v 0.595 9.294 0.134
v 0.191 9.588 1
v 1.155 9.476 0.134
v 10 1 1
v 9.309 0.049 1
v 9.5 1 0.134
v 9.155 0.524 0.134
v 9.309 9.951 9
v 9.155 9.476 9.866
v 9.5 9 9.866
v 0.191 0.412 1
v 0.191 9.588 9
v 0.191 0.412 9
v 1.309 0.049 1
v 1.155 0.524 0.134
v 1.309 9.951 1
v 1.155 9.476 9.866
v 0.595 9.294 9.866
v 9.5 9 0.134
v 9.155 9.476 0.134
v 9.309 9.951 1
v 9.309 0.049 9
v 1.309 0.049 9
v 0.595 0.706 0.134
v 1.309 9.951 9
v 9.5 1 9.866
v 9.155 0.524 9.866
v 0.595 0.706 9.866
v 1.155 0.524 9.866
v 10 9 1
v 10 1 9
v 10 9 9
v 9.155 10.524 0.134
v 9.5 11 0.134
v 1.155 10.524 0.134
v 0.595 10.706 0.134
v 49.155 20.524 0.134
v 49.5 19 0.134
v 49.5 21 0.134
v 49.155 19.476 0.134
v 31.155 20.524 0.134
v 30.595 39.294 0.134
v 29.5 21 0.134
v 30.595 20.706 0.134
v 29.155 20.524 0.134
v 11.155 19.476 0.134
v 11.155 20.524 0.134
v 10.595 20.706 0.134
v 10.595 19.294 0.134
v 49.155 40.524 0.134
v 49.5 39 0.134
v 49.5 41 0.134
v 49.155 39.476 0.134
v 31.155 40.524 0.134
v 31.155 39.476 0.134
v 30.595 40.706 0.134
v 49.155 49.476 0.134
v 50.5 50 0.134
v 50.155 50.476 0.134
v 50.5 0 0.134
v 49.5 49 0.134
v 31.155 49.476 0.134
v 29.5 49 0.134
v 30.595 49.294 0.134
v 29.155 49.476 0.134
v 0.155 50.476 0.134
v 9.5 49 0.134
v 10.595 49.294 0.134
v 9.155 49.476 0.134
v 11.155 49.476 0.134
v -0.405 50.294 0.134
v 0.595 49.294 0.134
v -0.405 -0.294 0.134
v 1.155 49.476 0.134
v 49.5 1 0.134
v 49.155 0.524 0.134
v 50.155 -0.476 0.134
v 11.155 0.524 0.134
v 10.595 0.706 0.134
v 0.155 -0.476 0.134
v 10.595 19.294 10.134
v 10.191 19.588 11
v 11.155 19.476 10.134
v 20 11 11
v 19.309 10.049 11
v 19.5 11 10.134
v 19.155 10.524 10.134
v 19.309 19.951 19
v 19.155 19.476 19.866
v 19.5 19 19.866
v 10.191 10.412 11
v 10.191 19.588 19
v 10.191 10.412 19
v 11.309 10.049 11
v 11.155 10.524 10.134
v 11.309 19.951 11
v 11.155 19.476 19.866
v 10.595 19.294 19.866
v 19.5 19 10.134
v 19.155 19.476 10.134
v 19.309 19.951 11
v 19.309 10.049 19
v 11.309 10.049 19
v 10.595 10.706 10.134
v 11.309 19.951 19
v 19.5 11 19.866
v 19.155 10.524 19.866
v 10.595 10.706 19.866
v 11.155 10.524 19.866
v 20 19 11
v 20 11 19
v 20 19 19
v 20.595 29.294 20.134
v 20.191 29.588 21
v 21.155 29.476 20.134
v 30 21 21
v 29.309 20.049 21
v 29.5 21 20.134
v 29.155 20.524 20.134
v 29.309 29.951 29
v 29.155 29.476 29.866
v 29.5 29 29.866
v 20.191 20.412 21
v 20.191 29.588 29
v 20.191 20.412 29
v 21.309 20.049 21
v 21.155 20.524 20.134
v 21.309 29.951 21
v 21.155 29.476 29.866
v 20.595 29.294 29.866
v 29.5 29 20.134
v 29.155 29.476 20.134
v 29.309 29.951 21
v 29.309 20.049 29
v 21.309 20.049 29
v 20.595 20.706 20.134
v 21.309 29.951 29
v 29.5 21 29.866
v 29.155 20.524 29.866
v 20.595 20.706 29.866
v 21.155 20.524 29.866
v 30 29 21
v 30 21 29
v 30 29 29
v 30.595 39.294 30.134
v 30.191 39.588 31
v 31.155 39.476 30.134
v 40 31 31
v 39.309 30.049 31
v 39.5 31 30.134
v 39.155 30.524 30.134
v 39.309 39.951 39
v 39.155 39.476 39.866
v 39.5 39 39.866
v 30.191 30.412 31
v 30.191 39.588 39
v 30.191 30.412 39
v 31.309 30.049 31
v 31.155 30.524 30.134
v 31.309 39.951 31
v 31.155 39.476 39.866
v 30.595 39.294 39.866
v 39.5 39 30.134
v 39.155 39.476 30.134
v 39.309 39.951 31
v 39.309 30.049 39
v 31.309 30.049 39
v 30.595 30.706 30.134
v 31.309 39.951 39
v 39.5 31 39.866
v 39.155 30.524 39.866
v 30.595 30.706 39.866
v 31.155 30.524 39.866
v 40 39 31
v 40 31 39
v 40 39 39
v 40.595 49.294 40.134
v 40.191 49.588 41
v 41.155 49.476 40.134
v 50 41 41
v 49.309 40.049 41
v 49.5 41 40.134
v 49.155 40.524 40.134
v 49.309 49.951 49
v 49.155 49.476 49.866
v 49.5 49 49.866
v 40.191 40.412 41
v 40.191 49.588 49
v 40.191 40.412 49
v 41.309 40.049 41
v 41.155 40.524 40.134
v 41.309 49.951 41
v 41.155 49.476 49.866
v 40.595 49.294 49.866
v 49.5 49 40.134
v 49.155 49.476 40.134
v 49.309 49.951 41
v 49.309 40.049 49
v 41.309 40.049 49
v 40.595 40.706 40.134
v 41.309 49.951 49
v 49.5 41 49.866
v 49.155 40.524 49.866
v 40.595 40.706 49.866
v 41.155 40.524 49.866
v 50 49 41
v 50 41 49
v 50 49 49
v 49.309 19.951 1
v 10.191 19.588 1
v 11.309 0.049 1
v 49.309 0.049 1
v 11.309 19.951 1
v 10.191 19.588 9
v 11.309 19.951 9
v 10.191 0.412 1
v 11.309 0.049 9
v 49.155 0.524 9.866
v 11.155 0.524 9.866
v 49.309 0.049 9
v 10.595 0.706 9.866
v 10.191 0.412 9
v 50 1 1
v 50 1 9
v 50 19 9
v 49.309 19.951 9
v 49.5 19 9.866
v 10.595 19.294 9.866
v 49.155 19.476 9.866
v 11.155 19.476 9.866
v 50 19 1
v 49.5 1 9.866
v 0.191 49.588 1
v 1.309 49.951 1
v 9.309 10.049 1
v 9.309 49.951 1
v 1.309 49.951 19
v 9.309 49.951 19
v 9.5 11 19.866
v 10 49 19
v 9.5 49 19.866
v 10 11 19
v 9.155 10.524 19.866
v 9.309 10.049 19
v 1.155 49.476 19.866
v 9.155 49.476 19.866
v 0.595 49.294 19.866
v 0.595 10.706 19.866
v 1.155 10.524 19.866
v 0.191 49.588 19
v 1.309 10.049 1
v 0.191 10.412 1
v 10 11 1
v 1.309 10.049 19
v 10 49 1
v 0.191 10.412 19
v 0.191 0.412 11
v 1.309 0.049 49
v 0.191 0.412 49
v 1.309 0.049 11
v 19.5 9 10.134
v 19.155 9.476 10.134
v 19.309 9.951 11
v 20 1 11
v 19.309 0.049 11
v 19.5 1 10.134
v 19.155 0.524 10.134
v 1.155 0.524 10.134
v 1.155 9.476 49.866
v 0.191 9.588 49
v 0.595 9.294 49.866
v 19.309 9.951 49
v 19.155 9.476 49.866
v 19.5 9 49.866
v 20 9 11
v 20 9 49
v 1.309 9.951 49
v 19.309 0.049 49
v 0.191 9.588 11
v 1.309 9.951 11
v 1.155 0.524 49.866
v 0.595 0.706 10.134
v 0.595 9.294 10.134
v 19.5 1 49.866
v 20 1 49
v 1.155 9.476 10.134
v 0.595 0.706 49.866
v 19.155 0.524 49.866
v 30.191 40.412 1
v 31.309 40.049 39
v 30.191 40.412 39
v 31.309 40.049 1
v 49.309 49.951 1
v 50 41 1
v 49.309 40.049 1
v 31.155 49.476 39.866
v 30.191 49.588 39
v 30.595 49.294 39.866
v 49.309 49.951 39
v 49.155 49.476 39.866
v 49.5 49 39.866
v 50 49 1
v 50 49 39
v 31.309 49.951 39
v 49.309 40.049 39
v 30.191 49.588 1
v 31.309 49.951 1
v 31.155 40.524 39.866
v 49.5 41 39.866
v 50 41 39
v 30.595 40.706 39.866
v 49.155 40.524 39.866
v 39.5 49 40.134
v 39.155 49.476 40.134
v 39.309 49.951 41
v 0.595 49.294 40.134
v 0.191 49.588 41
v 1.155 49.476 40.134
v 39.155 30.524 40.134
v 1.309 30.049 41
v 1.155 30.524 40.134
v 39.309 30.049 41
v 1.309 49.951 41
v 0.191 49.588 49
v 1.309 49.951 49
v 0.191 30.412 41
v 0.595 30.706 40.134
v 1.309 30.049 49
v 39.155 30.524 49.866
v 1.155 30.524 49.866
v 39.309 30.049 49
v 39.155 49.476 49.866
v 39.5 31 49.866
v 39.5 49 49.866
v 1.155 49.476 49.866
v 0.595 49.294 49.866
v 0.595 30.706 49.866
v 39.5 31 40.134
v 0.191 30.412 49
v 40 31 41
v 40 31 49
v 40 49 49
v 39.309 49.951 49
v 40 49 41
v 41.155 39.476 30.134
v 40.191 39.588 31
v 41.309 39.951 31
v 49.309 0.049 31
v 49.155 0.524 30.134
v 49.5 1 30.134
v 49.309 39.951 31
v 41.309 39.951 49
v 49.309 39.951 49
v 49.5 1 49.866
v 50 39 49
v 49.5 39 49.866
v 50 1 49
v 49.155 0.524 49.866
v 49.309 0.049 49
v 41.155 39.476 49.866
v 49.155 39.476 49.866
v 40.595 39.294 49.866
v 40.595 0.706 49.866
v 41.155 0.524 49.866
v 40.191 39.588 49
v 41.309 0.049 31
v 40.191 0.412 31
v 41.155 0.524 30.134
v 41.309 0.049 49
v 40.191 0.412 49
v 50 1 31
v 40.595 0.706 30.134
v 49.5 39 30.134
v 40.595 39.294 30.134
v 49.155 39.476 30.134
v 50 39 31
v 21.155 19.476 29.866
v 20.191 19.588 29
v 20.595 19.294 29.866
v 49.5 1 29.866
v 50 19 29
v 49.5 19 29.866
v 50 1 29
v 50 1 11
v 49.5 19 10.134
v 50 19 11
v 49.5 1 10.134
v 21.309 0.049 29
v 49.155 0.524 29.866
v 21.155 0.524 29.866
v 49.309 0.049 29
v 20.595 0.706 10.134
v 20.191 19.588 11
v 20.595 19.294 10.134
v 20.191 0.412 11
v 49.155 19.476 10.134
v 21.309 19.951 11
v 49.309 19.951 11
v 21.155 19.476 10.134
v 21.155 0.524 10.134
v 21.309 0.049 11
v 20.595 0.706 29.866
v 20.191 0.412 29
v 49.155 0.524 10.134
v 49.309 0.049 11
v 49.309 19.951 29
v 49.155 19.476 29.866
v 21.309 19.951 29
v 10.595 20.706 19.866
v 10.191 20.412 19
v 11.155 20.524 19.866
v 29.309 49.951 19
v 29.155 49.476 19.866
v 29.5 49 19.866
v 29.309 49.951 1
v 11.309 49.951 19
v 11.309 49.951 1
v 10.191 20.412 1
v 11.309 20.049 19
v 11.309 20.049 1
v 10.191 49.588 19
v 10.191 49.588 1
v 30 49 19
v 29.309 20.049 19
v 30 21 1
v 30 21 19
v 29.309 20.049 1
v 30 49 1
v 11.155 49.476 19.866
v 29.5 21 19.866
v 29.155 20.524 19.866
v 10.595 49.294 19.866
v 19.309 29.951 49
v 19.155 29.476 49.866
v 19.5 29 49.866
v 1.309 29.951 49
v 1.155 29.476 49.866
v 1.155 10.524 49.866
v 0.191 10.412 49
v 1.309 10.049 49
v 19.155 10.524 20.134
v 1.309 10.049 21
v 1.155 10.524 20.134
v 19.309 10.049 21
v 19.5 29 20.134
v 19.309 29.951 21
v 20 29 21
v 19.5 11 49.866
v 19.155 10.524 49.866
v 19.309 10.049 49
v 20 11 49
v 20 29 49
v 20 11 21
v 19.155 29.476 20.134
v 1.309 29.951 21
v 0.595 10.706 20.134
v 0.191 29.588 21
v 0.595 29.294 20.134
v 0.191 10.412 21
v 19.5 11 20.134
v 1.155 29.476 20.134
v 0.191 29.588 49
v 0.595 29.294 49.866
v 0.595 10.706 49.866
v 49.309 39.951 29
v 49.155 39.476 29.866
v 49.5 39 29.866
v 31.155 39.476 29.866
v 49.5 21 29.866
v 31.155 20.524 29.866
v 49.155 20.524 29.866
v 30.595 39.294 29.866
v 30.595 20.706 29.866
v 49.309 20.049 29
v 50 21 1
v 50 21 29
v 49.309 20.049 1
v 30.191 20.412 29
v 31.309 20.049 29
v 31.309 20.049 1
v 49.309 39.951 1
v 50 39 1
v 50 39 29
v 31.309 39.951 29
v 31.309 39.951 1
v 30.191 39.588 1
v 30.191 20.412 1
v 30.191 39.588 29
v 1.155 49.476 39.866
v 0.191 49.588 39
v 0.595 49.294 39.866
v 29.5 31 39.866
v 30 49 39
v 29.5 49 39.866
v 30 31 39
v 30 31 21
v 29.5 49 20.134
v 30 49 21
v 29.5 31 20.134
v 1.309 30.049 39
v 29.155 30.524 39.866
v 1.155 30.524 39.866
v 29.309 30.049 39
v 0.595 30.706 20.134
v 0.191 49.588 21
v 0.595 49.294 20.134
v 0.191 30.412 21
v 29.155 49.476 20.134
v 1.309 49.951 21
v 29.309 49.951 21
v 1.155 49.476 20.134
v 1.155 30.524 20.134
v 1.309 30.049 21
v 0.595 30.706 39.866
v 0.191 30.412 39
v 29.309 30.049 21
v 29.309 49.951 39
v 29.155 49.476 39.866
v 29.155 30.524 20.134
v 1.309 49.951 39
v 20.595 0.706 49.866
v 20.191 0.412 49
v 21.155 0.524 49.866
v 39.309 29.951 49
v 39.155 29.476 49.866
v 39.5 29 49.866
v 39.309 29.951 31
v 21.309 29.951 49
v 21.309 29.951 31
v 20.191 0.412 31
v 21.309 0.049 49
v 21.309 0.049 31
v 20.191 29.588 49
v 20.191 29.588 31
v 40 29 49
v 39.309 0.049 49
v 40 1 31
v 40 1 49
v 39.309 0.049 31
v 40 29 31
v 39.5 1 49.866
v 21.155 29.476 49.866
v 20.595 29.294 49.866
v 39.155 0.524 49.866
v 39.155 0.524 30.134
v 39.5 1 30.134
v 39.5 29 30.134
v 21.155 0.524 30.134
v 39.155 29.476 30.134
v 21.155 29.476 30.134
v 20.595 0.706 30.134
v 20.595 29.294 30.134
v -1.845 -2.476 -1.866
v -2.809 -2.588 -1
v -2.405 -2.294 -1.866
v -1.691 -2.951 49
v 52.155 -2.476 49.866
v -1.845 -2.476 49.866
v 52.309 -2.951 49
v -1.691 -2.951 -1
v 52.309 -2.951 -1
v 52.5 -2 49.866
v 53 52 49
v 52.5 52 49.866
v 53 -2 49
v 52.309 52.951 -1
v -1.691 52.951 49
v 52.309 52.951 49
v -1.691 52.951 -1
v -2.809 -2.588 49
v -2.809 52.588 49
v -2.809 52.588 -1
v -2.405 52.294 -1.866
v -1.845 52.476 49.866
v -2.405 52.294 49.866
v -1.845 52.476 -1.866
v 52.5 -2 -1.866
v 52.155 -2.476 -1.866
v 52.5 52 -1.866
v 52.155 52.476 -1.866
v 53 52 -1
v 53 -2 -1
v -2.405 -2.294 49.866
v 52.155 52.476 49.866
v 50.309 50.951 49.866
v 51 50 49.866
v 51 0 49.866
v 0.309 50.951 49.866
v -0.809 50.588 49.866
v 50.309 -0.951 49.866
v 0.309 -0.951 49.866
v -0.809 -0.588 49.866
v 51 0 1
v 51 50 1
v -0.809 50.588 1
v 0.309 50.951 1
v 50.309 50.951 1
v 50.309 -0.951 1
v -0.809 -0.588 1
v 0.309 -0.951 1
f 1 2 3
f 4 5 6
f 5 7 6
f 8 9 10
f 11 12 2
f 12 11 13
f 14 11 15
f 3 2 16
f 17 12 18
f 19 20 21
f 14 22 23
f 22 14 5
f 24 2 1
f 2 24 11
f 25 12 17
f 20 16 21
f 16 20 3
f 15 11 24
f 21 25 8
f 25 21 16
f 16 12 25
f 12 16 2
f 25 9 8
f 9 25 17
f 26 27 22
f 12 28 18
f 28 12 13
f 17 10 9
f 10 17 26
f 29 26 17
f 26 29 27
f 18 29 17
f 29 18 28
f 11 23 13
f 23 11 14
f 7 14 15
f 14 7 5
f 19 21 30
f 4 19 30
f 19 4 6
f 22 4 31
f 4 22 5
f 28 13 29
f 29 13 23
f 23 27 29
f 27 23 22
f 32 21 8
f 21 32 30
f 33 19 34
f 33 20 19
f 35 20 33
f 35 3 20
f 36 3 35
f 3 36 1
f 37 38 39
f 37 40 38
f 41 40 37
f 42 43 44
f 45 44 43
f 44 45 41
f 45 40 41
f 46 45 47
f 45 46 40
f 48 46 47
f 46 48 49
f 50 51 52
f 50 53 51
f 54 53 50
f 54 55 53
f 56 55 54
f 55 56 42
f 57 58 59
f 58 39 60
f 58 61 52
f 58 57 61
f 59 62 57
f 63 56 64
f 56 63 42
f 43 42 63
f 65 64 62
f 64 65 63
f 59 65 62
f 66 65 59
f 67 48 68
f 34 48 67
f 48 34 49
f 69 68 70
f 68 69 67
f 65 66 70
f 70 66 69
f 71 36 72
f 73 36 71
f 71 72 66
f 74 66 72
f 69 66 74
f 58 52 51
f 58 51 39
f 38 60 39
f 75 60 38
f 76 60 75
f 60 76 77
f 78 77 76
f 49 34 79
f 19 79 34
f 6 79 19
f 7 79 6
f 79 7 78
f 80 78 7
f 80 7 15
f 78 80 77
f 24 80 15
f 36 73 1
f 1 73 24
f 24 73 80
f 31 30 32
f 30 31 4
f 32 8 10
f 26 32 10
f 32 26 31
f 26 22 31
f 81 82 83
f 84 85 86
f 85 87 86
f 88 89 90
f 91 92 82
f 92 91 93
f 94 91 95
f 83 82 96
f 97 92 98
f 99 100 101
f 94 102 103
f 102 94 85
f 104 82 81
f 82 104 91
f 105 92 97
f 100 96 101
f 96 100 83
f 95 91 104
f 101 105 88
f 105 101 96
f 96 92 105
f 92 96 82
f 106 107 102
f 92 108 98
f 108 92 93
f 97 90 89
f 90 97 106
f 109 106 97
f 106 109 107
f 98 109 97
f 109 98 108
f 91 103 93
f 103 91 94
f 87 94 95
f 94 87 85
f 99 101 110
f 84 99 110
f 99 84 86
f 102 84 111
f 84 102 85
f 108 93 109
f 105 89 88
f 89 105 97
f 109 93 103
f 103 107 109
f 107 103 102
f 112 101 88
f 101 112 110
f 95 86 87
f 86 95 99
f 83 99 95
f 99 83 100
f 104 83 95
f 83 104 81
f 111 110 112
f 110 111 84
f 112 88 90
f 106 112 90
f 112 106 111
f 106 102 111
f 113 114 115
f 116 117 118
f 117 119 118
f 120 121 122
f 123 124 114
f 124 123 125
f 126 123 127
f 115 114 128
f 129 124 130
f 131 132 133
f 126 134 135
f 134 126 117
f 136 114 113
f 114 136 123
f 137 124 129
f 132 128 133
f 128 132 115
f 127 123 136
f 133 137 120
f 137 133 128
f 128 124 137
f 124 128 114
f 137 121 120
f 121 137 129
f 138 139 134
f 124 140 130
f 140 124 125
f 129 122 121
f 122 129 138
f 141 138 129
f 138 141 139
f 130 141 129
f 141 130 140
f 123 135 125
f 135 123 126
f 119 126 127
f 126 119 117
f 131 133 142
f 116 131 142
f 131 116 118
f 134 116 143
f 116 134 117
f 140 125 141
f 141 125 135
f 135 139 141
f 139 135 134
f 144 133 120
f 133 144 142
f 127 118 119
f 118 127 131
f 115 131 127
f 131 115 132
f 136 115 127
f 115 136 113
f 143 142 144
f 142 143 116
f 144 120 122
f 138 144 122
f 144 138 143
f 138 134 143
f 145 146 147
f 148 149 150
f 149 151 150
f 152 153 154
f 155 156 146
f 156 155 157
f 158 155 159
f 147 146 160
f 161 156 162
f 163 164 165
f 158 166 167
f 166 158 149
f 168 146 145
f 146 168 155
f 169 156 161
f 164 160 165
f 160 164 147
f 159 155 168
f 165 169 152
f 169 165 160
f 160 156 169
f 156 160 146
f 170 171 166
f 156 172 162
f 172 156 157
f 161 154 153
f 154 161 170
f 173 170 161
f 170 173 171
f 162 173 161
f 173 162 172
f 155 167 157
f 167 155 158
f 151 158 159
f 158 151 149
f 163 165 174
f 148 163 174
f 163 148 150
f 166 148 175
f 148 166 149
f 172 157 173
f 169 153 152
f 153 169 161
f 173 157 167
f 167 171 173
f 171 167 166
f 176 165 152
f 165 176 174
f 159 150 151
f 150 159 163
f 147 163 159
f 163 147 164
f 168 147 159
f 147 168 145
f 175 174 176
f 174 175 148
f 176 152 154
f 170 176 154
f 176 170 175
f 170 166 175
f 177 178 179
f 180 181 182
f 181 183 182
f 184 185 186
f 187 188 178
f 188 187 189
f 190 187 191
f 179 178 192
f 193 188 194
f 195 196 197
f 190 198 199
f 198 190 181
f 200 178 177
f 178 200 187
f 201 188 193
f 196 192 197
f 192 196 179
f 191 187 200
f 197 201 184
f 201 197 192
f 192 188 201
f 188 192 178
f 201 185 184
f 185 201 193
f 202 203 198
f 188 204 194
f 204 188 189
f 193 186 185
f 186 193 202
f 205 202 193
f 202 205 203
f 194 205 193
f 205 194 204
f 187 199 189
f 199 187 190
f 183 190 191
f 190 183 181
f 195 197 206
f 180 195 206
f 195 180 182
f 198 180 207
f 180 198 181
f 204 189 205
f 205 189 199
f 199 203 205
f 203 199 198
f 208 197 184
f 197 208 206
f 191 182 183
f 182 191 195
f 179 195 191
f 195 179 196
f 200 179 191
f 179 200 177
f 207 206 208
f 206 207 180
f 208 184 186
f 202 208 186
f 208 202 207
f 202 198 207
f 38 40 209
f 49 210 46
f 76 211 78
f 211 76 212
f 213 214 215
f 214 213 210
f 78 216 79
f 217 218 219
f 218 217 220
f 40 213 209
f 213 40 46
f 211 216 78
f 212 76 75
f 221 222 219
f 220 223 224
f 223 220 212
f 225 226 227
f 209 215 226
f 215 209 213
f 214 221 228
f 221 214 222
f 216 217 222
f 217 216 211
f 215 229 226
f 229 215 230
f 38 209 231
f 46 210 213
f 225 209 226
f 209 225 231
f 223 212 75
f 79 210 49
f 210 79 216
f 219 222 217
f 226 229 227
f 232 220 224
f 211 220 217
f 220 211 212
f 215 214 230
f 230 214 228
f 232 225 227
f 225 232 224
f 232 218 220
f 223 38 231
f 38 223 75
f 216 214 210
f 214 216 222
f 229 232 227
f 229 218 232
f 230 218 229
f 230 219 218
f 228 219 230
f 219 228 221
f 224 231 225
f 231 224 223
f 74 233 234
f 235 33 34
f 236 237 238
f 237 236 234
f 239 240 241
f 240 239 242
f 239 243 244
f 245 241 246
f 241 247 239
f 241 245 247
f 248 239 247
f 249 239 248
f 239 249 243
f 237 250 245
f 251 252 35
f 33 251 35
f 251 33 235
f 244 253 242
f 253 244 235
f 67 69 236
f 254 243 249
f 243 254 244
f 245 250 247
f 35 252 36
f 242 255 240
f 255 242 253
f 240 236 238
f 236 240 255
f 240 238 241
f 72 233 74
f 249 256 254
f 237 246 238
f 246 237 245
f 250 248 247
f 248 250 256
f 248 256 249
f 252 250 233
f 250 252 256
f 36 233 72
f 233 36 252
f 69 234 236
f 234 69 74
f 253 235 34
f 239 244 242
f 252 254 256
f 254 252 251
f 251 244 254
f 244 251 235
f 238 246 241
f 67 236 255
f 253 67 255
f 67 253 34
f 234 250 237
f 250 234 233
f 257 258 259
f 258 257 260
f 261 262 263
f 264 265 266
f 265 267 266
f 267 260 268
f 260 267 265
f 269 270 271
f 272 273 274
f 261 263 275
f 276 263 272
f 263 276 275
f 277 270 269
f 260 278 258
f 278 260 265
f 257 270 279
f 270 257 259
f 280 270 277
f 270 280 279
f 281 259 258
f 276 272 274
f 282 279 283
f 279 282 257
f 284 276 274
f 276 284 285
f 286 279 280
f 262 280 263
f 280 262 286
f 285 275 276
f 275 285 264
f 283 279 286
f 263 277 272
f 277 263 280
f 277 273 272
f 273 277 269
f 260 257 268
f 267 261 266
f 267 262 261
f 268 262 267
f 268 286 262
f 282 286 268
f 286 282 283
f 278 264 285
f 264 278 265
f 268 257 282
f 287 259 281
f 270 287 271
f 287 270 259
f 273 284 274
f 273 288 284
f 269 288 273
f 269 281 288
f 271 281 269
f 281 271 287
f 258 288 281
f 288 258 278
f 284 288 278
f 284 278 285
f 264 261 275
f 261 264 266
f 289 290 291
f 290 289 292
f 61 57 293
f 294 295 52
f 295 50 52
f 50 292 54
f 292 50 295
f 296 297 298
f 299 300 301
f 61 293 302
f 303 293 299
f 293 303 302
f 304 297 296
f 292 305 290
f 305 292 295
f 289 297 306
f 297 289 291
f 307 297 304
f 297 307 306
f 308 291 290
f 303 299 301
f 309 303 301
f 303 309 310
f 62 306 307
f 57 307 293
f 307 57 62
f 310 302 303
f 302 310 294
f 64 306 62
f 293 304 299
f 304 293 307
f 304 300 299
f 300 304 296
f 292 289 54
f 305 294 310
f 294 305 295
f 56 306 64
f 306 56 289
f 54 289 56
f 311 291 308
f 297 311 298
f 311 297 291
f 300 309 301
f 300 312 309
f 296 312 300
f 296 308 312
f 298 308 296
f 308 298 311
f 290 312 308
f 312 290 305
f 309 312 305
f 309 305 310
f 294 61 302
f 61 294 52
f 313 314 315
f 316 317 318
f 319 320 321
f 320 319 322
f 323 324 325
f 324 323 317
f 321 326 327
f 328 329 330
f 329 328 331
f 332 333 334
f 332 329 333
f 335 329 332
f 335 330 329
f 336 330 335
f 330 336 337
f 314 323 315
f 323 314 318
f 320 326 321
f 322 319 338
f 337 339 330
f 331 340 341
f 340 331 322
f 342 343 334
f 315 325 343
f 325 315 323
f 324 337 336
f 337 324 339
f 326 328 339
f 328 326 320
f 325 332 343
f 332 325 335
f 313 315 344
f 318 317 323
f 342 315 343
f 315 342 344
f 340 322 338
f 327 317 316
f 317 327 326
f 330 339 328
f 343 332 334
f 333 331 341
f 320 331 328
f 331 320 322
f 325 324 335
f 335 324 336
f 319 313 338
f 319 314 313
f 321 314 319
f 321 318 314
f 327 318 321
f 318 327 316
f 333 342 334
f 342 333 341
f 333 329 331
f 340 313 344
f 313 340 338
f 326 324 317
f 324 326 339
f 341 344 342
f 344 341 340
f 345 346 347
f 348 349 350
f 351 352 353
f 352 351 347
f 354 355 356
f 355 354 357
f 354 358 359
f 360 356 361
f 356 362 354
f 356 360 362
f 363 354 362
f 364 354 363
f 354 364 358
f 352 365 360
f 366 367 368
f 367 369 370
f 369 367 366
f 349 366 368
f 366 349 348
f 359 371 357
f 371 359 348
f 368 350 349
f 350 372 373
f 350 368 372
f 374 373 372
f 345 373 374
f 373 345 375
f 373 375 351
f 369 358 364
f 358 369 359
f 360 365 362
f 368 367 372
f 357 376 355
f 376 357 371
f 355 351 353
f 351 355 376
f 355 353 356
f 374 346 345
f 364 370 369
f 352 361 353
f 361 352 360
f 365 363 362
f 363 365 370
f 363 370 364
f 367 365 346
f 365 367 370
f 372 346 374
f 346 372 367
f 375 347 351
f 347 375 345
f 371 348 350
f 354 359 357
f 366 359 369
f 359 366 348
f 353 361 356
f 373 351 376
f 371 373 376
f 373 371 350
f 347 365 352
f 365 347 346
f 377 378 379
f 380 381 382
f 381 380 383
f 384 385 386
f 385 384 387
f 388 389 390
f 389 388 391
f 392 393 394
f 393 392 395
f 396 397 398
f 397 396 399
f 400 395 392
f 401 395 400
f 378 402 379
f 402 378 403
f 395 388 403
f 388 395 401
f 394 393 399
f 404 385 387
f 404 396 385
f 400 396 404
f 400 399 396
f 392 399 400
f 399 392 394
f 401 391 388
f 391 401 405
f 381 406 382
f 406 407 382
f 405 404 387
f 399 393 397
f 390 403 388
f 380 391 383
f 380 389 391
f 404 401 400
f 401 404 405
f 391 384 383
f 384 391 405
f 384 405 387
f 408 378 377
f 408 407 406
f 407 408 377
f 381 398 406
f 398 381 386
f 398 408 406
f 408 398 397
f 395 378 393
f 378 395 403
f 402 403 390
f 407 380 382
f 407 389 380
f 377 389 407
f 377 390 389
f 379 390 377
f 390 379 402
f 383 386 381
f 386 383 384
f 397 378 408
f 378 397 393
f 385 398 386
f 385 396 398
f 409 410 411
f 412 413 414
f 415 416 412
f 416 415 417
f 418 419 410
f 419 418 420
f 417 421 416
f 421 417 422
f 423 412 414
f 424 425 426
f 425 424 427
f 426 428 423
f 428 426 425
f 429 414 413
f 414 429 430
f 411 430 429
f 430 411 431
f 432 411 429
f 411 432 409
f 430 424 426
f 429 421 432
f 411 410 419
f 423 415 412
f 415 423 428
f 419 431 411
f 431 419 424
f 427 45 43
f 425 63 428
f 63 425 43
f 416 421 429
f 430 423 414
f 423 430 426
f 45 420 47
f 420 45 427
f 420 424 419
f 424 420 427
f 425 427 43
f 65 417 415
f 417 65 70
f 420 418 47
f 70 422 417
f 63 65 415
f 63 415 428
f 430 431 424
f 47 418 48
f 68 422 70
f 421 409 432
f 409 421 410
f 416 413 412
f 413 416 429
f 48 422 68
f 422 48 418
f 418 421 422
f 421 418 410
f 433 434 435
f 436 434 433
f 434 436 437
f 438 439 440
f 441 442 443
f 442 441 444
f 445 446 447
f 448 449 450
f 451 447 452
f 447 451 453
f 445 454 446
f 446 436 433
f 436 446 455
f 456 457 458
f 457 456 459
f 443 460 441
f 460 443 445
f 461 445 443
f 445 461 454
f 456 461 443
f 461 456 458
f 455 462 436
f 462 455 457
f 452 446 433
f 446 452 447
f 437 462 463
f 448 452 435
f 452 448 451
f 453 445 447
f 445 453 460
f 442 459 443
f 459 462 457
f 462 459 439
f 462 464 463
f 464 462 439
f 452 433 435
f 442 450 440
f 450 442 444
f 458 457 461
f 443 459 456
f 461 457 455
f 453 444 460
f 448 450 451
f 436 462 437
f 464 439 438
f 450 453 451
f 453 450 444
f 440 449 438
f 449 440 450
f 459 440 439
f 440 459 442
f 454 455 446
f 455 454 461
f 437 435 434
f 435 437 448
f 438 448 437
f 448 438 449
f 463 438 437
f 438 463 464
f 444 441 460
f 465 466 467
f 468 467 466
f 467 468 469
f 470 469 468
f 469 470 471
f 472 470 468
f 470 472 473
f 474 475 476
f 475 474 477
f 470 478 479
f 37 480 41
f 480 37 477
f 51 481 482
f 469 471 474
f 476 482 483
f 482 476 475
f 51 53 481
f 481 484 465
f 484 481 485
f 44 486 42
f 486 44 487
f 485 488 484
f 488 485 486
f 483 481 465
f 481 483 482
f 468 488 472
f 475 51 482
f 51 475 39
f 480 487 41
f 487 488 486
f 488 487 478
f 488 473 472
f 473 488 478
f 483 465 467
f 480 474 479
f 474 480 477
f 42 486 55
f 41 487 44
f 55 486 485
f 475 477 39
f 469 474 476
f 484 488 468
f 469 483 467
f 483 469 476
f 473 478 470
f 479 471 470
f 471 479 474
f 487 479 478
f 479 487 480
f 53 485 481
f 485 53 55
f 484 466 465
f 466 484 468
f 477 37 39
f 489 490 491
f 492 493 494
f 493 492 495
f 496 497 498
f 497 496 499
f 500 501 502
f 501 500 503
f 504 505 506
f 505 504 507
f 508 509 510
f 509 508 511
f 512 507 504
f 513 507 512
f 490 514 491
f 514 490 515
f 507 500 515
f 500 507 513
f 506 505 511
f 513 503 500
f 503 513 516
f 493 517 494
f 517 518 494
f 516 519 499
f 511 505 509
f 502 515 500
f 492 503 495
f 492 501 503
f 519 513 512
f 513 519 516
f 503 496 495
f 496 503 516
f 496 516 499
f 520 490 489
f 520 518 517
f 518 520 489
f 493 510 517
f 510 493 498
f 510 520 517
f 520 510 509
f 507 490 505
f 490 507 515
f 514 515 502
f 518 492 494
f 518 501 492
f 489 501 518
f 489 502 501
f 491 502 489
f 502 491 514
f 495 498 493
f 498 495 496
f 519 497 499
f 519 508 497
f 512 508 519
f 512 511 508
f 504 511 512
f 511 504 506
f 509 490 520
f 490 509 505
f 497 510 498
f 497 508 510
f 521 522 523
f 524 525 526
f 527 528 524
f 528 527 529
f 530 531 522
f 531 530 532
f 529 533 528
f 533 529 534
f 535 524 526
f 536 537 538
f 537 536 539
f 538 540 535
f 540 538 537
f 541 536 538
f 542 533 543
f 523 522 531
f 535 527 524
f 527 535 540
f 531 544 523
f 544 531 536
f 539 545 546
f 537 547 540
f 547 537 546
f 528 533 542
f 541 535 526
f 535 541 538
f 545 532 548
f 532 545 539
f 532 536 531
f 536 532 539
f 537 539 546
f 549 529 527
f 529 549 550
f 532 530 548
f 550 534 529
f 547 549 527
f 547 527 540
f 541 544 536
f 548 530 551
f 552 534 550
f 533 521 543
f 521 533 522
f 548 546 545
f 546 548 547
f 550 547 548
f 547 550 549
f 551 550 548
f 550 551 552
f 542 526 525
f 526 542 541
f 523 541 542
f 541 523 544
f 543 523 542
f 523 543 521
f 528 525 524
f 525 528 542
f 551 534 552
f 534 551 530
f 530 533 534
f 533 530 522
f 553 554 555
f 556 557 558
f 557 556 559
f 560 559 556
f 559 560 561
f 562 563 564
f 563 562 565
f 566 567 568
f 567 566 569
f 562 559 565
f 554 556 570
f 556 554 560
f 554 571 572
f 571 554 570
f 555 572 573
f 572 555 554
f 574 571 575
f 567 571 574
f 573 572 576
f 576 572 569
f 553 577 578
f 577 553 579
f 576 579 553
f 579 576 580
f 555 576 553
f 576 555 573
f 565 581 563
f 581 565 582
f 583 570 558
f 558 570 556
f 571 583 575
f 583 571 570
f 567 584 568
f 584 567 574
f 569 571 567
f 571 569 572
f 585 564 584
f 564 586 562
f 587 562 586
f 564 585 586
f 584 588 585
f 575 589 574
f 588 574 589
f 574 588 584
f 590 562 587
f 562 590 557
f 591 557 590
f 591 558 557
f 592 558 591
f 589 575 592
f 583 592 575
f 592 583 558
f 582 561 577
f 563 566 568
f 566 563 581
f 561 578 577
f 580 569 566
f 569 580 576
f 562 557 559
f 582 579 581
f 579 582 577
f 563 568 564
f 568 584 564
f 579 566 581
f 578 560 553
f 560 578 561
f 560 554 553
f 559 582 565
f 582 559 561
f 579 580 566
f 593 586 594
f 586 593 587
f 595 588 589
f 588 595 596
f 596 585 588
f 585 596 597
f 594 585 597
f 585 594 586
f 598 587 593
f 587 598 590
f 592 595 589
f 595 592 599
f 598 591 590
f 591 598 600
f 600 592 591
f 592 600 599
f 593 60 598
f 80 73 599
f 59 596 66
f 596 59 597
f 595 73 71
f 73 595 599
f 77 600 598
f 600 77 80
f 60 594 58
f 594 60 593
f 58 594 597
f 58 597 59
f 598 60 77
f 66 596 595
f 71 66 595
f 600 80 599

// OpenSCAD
// file: modules.scad
unit = 10;

module roundCube(dimensions, margin=1) {
  cubeDimensions = [for(d = dimensions) d - 2*margin];
  translate([margin, margin, margin])
  minkowski() {
    cube(cubeDimensions);
    sphere(r=margin, center=true);
  }
}

module puzzleBox(unit, margin=1) {
  u = 5 * unit + margin;
  2m = 2 * margin;
  hm = -margin / 2;

  translate([hm, hm, 0]) {
    color([0, 1, 0]) {
      difference() {
        translate([-margin, -margin, -margin])
        roundCube([u+2m, u+2m, u]);

        translate([0, 0, 2m])
        roundCube([u, u, u]);
        translate([0, 0, 0])
        roundCube([u, u, u]);
      }
    }
  }
}
// main file
include <modules.scad>

module thrice(translations, dimensions, unit) {
  ts = [for(t=translations) t * unit];
  ds = [for(d=dimensions) d * unit];

  translate(ts)
  roundCube(ds);

  translate([ts[2], ts[0], ts[1]])
  roundCube([ds[2], ds[0], ds[1]]);

  translate([ts[1], ts[2], ts[0]])
  roundCube([ds[1], ds[2], ds[0]]);
}

module puzzle(unit) {
  for(i=[0:4]) {
    translate([i*unit, i*unit, i*unit])
    roundCube([unit, unit, unit]);
  }

  color([0, 0, 1]) {
    thrice([1,0,0], [4,2,1], unit);
    thrice([3,4,0], [2,1,4], unit);
  }

  color([1, 0, 0]) {
    thrice([2,0,1], [3,2,2], unit);
    thrice([3,2,0], [2,2,3], unit);
  }
}

puzzle(unit);
puzzleBox(unit, 2);
